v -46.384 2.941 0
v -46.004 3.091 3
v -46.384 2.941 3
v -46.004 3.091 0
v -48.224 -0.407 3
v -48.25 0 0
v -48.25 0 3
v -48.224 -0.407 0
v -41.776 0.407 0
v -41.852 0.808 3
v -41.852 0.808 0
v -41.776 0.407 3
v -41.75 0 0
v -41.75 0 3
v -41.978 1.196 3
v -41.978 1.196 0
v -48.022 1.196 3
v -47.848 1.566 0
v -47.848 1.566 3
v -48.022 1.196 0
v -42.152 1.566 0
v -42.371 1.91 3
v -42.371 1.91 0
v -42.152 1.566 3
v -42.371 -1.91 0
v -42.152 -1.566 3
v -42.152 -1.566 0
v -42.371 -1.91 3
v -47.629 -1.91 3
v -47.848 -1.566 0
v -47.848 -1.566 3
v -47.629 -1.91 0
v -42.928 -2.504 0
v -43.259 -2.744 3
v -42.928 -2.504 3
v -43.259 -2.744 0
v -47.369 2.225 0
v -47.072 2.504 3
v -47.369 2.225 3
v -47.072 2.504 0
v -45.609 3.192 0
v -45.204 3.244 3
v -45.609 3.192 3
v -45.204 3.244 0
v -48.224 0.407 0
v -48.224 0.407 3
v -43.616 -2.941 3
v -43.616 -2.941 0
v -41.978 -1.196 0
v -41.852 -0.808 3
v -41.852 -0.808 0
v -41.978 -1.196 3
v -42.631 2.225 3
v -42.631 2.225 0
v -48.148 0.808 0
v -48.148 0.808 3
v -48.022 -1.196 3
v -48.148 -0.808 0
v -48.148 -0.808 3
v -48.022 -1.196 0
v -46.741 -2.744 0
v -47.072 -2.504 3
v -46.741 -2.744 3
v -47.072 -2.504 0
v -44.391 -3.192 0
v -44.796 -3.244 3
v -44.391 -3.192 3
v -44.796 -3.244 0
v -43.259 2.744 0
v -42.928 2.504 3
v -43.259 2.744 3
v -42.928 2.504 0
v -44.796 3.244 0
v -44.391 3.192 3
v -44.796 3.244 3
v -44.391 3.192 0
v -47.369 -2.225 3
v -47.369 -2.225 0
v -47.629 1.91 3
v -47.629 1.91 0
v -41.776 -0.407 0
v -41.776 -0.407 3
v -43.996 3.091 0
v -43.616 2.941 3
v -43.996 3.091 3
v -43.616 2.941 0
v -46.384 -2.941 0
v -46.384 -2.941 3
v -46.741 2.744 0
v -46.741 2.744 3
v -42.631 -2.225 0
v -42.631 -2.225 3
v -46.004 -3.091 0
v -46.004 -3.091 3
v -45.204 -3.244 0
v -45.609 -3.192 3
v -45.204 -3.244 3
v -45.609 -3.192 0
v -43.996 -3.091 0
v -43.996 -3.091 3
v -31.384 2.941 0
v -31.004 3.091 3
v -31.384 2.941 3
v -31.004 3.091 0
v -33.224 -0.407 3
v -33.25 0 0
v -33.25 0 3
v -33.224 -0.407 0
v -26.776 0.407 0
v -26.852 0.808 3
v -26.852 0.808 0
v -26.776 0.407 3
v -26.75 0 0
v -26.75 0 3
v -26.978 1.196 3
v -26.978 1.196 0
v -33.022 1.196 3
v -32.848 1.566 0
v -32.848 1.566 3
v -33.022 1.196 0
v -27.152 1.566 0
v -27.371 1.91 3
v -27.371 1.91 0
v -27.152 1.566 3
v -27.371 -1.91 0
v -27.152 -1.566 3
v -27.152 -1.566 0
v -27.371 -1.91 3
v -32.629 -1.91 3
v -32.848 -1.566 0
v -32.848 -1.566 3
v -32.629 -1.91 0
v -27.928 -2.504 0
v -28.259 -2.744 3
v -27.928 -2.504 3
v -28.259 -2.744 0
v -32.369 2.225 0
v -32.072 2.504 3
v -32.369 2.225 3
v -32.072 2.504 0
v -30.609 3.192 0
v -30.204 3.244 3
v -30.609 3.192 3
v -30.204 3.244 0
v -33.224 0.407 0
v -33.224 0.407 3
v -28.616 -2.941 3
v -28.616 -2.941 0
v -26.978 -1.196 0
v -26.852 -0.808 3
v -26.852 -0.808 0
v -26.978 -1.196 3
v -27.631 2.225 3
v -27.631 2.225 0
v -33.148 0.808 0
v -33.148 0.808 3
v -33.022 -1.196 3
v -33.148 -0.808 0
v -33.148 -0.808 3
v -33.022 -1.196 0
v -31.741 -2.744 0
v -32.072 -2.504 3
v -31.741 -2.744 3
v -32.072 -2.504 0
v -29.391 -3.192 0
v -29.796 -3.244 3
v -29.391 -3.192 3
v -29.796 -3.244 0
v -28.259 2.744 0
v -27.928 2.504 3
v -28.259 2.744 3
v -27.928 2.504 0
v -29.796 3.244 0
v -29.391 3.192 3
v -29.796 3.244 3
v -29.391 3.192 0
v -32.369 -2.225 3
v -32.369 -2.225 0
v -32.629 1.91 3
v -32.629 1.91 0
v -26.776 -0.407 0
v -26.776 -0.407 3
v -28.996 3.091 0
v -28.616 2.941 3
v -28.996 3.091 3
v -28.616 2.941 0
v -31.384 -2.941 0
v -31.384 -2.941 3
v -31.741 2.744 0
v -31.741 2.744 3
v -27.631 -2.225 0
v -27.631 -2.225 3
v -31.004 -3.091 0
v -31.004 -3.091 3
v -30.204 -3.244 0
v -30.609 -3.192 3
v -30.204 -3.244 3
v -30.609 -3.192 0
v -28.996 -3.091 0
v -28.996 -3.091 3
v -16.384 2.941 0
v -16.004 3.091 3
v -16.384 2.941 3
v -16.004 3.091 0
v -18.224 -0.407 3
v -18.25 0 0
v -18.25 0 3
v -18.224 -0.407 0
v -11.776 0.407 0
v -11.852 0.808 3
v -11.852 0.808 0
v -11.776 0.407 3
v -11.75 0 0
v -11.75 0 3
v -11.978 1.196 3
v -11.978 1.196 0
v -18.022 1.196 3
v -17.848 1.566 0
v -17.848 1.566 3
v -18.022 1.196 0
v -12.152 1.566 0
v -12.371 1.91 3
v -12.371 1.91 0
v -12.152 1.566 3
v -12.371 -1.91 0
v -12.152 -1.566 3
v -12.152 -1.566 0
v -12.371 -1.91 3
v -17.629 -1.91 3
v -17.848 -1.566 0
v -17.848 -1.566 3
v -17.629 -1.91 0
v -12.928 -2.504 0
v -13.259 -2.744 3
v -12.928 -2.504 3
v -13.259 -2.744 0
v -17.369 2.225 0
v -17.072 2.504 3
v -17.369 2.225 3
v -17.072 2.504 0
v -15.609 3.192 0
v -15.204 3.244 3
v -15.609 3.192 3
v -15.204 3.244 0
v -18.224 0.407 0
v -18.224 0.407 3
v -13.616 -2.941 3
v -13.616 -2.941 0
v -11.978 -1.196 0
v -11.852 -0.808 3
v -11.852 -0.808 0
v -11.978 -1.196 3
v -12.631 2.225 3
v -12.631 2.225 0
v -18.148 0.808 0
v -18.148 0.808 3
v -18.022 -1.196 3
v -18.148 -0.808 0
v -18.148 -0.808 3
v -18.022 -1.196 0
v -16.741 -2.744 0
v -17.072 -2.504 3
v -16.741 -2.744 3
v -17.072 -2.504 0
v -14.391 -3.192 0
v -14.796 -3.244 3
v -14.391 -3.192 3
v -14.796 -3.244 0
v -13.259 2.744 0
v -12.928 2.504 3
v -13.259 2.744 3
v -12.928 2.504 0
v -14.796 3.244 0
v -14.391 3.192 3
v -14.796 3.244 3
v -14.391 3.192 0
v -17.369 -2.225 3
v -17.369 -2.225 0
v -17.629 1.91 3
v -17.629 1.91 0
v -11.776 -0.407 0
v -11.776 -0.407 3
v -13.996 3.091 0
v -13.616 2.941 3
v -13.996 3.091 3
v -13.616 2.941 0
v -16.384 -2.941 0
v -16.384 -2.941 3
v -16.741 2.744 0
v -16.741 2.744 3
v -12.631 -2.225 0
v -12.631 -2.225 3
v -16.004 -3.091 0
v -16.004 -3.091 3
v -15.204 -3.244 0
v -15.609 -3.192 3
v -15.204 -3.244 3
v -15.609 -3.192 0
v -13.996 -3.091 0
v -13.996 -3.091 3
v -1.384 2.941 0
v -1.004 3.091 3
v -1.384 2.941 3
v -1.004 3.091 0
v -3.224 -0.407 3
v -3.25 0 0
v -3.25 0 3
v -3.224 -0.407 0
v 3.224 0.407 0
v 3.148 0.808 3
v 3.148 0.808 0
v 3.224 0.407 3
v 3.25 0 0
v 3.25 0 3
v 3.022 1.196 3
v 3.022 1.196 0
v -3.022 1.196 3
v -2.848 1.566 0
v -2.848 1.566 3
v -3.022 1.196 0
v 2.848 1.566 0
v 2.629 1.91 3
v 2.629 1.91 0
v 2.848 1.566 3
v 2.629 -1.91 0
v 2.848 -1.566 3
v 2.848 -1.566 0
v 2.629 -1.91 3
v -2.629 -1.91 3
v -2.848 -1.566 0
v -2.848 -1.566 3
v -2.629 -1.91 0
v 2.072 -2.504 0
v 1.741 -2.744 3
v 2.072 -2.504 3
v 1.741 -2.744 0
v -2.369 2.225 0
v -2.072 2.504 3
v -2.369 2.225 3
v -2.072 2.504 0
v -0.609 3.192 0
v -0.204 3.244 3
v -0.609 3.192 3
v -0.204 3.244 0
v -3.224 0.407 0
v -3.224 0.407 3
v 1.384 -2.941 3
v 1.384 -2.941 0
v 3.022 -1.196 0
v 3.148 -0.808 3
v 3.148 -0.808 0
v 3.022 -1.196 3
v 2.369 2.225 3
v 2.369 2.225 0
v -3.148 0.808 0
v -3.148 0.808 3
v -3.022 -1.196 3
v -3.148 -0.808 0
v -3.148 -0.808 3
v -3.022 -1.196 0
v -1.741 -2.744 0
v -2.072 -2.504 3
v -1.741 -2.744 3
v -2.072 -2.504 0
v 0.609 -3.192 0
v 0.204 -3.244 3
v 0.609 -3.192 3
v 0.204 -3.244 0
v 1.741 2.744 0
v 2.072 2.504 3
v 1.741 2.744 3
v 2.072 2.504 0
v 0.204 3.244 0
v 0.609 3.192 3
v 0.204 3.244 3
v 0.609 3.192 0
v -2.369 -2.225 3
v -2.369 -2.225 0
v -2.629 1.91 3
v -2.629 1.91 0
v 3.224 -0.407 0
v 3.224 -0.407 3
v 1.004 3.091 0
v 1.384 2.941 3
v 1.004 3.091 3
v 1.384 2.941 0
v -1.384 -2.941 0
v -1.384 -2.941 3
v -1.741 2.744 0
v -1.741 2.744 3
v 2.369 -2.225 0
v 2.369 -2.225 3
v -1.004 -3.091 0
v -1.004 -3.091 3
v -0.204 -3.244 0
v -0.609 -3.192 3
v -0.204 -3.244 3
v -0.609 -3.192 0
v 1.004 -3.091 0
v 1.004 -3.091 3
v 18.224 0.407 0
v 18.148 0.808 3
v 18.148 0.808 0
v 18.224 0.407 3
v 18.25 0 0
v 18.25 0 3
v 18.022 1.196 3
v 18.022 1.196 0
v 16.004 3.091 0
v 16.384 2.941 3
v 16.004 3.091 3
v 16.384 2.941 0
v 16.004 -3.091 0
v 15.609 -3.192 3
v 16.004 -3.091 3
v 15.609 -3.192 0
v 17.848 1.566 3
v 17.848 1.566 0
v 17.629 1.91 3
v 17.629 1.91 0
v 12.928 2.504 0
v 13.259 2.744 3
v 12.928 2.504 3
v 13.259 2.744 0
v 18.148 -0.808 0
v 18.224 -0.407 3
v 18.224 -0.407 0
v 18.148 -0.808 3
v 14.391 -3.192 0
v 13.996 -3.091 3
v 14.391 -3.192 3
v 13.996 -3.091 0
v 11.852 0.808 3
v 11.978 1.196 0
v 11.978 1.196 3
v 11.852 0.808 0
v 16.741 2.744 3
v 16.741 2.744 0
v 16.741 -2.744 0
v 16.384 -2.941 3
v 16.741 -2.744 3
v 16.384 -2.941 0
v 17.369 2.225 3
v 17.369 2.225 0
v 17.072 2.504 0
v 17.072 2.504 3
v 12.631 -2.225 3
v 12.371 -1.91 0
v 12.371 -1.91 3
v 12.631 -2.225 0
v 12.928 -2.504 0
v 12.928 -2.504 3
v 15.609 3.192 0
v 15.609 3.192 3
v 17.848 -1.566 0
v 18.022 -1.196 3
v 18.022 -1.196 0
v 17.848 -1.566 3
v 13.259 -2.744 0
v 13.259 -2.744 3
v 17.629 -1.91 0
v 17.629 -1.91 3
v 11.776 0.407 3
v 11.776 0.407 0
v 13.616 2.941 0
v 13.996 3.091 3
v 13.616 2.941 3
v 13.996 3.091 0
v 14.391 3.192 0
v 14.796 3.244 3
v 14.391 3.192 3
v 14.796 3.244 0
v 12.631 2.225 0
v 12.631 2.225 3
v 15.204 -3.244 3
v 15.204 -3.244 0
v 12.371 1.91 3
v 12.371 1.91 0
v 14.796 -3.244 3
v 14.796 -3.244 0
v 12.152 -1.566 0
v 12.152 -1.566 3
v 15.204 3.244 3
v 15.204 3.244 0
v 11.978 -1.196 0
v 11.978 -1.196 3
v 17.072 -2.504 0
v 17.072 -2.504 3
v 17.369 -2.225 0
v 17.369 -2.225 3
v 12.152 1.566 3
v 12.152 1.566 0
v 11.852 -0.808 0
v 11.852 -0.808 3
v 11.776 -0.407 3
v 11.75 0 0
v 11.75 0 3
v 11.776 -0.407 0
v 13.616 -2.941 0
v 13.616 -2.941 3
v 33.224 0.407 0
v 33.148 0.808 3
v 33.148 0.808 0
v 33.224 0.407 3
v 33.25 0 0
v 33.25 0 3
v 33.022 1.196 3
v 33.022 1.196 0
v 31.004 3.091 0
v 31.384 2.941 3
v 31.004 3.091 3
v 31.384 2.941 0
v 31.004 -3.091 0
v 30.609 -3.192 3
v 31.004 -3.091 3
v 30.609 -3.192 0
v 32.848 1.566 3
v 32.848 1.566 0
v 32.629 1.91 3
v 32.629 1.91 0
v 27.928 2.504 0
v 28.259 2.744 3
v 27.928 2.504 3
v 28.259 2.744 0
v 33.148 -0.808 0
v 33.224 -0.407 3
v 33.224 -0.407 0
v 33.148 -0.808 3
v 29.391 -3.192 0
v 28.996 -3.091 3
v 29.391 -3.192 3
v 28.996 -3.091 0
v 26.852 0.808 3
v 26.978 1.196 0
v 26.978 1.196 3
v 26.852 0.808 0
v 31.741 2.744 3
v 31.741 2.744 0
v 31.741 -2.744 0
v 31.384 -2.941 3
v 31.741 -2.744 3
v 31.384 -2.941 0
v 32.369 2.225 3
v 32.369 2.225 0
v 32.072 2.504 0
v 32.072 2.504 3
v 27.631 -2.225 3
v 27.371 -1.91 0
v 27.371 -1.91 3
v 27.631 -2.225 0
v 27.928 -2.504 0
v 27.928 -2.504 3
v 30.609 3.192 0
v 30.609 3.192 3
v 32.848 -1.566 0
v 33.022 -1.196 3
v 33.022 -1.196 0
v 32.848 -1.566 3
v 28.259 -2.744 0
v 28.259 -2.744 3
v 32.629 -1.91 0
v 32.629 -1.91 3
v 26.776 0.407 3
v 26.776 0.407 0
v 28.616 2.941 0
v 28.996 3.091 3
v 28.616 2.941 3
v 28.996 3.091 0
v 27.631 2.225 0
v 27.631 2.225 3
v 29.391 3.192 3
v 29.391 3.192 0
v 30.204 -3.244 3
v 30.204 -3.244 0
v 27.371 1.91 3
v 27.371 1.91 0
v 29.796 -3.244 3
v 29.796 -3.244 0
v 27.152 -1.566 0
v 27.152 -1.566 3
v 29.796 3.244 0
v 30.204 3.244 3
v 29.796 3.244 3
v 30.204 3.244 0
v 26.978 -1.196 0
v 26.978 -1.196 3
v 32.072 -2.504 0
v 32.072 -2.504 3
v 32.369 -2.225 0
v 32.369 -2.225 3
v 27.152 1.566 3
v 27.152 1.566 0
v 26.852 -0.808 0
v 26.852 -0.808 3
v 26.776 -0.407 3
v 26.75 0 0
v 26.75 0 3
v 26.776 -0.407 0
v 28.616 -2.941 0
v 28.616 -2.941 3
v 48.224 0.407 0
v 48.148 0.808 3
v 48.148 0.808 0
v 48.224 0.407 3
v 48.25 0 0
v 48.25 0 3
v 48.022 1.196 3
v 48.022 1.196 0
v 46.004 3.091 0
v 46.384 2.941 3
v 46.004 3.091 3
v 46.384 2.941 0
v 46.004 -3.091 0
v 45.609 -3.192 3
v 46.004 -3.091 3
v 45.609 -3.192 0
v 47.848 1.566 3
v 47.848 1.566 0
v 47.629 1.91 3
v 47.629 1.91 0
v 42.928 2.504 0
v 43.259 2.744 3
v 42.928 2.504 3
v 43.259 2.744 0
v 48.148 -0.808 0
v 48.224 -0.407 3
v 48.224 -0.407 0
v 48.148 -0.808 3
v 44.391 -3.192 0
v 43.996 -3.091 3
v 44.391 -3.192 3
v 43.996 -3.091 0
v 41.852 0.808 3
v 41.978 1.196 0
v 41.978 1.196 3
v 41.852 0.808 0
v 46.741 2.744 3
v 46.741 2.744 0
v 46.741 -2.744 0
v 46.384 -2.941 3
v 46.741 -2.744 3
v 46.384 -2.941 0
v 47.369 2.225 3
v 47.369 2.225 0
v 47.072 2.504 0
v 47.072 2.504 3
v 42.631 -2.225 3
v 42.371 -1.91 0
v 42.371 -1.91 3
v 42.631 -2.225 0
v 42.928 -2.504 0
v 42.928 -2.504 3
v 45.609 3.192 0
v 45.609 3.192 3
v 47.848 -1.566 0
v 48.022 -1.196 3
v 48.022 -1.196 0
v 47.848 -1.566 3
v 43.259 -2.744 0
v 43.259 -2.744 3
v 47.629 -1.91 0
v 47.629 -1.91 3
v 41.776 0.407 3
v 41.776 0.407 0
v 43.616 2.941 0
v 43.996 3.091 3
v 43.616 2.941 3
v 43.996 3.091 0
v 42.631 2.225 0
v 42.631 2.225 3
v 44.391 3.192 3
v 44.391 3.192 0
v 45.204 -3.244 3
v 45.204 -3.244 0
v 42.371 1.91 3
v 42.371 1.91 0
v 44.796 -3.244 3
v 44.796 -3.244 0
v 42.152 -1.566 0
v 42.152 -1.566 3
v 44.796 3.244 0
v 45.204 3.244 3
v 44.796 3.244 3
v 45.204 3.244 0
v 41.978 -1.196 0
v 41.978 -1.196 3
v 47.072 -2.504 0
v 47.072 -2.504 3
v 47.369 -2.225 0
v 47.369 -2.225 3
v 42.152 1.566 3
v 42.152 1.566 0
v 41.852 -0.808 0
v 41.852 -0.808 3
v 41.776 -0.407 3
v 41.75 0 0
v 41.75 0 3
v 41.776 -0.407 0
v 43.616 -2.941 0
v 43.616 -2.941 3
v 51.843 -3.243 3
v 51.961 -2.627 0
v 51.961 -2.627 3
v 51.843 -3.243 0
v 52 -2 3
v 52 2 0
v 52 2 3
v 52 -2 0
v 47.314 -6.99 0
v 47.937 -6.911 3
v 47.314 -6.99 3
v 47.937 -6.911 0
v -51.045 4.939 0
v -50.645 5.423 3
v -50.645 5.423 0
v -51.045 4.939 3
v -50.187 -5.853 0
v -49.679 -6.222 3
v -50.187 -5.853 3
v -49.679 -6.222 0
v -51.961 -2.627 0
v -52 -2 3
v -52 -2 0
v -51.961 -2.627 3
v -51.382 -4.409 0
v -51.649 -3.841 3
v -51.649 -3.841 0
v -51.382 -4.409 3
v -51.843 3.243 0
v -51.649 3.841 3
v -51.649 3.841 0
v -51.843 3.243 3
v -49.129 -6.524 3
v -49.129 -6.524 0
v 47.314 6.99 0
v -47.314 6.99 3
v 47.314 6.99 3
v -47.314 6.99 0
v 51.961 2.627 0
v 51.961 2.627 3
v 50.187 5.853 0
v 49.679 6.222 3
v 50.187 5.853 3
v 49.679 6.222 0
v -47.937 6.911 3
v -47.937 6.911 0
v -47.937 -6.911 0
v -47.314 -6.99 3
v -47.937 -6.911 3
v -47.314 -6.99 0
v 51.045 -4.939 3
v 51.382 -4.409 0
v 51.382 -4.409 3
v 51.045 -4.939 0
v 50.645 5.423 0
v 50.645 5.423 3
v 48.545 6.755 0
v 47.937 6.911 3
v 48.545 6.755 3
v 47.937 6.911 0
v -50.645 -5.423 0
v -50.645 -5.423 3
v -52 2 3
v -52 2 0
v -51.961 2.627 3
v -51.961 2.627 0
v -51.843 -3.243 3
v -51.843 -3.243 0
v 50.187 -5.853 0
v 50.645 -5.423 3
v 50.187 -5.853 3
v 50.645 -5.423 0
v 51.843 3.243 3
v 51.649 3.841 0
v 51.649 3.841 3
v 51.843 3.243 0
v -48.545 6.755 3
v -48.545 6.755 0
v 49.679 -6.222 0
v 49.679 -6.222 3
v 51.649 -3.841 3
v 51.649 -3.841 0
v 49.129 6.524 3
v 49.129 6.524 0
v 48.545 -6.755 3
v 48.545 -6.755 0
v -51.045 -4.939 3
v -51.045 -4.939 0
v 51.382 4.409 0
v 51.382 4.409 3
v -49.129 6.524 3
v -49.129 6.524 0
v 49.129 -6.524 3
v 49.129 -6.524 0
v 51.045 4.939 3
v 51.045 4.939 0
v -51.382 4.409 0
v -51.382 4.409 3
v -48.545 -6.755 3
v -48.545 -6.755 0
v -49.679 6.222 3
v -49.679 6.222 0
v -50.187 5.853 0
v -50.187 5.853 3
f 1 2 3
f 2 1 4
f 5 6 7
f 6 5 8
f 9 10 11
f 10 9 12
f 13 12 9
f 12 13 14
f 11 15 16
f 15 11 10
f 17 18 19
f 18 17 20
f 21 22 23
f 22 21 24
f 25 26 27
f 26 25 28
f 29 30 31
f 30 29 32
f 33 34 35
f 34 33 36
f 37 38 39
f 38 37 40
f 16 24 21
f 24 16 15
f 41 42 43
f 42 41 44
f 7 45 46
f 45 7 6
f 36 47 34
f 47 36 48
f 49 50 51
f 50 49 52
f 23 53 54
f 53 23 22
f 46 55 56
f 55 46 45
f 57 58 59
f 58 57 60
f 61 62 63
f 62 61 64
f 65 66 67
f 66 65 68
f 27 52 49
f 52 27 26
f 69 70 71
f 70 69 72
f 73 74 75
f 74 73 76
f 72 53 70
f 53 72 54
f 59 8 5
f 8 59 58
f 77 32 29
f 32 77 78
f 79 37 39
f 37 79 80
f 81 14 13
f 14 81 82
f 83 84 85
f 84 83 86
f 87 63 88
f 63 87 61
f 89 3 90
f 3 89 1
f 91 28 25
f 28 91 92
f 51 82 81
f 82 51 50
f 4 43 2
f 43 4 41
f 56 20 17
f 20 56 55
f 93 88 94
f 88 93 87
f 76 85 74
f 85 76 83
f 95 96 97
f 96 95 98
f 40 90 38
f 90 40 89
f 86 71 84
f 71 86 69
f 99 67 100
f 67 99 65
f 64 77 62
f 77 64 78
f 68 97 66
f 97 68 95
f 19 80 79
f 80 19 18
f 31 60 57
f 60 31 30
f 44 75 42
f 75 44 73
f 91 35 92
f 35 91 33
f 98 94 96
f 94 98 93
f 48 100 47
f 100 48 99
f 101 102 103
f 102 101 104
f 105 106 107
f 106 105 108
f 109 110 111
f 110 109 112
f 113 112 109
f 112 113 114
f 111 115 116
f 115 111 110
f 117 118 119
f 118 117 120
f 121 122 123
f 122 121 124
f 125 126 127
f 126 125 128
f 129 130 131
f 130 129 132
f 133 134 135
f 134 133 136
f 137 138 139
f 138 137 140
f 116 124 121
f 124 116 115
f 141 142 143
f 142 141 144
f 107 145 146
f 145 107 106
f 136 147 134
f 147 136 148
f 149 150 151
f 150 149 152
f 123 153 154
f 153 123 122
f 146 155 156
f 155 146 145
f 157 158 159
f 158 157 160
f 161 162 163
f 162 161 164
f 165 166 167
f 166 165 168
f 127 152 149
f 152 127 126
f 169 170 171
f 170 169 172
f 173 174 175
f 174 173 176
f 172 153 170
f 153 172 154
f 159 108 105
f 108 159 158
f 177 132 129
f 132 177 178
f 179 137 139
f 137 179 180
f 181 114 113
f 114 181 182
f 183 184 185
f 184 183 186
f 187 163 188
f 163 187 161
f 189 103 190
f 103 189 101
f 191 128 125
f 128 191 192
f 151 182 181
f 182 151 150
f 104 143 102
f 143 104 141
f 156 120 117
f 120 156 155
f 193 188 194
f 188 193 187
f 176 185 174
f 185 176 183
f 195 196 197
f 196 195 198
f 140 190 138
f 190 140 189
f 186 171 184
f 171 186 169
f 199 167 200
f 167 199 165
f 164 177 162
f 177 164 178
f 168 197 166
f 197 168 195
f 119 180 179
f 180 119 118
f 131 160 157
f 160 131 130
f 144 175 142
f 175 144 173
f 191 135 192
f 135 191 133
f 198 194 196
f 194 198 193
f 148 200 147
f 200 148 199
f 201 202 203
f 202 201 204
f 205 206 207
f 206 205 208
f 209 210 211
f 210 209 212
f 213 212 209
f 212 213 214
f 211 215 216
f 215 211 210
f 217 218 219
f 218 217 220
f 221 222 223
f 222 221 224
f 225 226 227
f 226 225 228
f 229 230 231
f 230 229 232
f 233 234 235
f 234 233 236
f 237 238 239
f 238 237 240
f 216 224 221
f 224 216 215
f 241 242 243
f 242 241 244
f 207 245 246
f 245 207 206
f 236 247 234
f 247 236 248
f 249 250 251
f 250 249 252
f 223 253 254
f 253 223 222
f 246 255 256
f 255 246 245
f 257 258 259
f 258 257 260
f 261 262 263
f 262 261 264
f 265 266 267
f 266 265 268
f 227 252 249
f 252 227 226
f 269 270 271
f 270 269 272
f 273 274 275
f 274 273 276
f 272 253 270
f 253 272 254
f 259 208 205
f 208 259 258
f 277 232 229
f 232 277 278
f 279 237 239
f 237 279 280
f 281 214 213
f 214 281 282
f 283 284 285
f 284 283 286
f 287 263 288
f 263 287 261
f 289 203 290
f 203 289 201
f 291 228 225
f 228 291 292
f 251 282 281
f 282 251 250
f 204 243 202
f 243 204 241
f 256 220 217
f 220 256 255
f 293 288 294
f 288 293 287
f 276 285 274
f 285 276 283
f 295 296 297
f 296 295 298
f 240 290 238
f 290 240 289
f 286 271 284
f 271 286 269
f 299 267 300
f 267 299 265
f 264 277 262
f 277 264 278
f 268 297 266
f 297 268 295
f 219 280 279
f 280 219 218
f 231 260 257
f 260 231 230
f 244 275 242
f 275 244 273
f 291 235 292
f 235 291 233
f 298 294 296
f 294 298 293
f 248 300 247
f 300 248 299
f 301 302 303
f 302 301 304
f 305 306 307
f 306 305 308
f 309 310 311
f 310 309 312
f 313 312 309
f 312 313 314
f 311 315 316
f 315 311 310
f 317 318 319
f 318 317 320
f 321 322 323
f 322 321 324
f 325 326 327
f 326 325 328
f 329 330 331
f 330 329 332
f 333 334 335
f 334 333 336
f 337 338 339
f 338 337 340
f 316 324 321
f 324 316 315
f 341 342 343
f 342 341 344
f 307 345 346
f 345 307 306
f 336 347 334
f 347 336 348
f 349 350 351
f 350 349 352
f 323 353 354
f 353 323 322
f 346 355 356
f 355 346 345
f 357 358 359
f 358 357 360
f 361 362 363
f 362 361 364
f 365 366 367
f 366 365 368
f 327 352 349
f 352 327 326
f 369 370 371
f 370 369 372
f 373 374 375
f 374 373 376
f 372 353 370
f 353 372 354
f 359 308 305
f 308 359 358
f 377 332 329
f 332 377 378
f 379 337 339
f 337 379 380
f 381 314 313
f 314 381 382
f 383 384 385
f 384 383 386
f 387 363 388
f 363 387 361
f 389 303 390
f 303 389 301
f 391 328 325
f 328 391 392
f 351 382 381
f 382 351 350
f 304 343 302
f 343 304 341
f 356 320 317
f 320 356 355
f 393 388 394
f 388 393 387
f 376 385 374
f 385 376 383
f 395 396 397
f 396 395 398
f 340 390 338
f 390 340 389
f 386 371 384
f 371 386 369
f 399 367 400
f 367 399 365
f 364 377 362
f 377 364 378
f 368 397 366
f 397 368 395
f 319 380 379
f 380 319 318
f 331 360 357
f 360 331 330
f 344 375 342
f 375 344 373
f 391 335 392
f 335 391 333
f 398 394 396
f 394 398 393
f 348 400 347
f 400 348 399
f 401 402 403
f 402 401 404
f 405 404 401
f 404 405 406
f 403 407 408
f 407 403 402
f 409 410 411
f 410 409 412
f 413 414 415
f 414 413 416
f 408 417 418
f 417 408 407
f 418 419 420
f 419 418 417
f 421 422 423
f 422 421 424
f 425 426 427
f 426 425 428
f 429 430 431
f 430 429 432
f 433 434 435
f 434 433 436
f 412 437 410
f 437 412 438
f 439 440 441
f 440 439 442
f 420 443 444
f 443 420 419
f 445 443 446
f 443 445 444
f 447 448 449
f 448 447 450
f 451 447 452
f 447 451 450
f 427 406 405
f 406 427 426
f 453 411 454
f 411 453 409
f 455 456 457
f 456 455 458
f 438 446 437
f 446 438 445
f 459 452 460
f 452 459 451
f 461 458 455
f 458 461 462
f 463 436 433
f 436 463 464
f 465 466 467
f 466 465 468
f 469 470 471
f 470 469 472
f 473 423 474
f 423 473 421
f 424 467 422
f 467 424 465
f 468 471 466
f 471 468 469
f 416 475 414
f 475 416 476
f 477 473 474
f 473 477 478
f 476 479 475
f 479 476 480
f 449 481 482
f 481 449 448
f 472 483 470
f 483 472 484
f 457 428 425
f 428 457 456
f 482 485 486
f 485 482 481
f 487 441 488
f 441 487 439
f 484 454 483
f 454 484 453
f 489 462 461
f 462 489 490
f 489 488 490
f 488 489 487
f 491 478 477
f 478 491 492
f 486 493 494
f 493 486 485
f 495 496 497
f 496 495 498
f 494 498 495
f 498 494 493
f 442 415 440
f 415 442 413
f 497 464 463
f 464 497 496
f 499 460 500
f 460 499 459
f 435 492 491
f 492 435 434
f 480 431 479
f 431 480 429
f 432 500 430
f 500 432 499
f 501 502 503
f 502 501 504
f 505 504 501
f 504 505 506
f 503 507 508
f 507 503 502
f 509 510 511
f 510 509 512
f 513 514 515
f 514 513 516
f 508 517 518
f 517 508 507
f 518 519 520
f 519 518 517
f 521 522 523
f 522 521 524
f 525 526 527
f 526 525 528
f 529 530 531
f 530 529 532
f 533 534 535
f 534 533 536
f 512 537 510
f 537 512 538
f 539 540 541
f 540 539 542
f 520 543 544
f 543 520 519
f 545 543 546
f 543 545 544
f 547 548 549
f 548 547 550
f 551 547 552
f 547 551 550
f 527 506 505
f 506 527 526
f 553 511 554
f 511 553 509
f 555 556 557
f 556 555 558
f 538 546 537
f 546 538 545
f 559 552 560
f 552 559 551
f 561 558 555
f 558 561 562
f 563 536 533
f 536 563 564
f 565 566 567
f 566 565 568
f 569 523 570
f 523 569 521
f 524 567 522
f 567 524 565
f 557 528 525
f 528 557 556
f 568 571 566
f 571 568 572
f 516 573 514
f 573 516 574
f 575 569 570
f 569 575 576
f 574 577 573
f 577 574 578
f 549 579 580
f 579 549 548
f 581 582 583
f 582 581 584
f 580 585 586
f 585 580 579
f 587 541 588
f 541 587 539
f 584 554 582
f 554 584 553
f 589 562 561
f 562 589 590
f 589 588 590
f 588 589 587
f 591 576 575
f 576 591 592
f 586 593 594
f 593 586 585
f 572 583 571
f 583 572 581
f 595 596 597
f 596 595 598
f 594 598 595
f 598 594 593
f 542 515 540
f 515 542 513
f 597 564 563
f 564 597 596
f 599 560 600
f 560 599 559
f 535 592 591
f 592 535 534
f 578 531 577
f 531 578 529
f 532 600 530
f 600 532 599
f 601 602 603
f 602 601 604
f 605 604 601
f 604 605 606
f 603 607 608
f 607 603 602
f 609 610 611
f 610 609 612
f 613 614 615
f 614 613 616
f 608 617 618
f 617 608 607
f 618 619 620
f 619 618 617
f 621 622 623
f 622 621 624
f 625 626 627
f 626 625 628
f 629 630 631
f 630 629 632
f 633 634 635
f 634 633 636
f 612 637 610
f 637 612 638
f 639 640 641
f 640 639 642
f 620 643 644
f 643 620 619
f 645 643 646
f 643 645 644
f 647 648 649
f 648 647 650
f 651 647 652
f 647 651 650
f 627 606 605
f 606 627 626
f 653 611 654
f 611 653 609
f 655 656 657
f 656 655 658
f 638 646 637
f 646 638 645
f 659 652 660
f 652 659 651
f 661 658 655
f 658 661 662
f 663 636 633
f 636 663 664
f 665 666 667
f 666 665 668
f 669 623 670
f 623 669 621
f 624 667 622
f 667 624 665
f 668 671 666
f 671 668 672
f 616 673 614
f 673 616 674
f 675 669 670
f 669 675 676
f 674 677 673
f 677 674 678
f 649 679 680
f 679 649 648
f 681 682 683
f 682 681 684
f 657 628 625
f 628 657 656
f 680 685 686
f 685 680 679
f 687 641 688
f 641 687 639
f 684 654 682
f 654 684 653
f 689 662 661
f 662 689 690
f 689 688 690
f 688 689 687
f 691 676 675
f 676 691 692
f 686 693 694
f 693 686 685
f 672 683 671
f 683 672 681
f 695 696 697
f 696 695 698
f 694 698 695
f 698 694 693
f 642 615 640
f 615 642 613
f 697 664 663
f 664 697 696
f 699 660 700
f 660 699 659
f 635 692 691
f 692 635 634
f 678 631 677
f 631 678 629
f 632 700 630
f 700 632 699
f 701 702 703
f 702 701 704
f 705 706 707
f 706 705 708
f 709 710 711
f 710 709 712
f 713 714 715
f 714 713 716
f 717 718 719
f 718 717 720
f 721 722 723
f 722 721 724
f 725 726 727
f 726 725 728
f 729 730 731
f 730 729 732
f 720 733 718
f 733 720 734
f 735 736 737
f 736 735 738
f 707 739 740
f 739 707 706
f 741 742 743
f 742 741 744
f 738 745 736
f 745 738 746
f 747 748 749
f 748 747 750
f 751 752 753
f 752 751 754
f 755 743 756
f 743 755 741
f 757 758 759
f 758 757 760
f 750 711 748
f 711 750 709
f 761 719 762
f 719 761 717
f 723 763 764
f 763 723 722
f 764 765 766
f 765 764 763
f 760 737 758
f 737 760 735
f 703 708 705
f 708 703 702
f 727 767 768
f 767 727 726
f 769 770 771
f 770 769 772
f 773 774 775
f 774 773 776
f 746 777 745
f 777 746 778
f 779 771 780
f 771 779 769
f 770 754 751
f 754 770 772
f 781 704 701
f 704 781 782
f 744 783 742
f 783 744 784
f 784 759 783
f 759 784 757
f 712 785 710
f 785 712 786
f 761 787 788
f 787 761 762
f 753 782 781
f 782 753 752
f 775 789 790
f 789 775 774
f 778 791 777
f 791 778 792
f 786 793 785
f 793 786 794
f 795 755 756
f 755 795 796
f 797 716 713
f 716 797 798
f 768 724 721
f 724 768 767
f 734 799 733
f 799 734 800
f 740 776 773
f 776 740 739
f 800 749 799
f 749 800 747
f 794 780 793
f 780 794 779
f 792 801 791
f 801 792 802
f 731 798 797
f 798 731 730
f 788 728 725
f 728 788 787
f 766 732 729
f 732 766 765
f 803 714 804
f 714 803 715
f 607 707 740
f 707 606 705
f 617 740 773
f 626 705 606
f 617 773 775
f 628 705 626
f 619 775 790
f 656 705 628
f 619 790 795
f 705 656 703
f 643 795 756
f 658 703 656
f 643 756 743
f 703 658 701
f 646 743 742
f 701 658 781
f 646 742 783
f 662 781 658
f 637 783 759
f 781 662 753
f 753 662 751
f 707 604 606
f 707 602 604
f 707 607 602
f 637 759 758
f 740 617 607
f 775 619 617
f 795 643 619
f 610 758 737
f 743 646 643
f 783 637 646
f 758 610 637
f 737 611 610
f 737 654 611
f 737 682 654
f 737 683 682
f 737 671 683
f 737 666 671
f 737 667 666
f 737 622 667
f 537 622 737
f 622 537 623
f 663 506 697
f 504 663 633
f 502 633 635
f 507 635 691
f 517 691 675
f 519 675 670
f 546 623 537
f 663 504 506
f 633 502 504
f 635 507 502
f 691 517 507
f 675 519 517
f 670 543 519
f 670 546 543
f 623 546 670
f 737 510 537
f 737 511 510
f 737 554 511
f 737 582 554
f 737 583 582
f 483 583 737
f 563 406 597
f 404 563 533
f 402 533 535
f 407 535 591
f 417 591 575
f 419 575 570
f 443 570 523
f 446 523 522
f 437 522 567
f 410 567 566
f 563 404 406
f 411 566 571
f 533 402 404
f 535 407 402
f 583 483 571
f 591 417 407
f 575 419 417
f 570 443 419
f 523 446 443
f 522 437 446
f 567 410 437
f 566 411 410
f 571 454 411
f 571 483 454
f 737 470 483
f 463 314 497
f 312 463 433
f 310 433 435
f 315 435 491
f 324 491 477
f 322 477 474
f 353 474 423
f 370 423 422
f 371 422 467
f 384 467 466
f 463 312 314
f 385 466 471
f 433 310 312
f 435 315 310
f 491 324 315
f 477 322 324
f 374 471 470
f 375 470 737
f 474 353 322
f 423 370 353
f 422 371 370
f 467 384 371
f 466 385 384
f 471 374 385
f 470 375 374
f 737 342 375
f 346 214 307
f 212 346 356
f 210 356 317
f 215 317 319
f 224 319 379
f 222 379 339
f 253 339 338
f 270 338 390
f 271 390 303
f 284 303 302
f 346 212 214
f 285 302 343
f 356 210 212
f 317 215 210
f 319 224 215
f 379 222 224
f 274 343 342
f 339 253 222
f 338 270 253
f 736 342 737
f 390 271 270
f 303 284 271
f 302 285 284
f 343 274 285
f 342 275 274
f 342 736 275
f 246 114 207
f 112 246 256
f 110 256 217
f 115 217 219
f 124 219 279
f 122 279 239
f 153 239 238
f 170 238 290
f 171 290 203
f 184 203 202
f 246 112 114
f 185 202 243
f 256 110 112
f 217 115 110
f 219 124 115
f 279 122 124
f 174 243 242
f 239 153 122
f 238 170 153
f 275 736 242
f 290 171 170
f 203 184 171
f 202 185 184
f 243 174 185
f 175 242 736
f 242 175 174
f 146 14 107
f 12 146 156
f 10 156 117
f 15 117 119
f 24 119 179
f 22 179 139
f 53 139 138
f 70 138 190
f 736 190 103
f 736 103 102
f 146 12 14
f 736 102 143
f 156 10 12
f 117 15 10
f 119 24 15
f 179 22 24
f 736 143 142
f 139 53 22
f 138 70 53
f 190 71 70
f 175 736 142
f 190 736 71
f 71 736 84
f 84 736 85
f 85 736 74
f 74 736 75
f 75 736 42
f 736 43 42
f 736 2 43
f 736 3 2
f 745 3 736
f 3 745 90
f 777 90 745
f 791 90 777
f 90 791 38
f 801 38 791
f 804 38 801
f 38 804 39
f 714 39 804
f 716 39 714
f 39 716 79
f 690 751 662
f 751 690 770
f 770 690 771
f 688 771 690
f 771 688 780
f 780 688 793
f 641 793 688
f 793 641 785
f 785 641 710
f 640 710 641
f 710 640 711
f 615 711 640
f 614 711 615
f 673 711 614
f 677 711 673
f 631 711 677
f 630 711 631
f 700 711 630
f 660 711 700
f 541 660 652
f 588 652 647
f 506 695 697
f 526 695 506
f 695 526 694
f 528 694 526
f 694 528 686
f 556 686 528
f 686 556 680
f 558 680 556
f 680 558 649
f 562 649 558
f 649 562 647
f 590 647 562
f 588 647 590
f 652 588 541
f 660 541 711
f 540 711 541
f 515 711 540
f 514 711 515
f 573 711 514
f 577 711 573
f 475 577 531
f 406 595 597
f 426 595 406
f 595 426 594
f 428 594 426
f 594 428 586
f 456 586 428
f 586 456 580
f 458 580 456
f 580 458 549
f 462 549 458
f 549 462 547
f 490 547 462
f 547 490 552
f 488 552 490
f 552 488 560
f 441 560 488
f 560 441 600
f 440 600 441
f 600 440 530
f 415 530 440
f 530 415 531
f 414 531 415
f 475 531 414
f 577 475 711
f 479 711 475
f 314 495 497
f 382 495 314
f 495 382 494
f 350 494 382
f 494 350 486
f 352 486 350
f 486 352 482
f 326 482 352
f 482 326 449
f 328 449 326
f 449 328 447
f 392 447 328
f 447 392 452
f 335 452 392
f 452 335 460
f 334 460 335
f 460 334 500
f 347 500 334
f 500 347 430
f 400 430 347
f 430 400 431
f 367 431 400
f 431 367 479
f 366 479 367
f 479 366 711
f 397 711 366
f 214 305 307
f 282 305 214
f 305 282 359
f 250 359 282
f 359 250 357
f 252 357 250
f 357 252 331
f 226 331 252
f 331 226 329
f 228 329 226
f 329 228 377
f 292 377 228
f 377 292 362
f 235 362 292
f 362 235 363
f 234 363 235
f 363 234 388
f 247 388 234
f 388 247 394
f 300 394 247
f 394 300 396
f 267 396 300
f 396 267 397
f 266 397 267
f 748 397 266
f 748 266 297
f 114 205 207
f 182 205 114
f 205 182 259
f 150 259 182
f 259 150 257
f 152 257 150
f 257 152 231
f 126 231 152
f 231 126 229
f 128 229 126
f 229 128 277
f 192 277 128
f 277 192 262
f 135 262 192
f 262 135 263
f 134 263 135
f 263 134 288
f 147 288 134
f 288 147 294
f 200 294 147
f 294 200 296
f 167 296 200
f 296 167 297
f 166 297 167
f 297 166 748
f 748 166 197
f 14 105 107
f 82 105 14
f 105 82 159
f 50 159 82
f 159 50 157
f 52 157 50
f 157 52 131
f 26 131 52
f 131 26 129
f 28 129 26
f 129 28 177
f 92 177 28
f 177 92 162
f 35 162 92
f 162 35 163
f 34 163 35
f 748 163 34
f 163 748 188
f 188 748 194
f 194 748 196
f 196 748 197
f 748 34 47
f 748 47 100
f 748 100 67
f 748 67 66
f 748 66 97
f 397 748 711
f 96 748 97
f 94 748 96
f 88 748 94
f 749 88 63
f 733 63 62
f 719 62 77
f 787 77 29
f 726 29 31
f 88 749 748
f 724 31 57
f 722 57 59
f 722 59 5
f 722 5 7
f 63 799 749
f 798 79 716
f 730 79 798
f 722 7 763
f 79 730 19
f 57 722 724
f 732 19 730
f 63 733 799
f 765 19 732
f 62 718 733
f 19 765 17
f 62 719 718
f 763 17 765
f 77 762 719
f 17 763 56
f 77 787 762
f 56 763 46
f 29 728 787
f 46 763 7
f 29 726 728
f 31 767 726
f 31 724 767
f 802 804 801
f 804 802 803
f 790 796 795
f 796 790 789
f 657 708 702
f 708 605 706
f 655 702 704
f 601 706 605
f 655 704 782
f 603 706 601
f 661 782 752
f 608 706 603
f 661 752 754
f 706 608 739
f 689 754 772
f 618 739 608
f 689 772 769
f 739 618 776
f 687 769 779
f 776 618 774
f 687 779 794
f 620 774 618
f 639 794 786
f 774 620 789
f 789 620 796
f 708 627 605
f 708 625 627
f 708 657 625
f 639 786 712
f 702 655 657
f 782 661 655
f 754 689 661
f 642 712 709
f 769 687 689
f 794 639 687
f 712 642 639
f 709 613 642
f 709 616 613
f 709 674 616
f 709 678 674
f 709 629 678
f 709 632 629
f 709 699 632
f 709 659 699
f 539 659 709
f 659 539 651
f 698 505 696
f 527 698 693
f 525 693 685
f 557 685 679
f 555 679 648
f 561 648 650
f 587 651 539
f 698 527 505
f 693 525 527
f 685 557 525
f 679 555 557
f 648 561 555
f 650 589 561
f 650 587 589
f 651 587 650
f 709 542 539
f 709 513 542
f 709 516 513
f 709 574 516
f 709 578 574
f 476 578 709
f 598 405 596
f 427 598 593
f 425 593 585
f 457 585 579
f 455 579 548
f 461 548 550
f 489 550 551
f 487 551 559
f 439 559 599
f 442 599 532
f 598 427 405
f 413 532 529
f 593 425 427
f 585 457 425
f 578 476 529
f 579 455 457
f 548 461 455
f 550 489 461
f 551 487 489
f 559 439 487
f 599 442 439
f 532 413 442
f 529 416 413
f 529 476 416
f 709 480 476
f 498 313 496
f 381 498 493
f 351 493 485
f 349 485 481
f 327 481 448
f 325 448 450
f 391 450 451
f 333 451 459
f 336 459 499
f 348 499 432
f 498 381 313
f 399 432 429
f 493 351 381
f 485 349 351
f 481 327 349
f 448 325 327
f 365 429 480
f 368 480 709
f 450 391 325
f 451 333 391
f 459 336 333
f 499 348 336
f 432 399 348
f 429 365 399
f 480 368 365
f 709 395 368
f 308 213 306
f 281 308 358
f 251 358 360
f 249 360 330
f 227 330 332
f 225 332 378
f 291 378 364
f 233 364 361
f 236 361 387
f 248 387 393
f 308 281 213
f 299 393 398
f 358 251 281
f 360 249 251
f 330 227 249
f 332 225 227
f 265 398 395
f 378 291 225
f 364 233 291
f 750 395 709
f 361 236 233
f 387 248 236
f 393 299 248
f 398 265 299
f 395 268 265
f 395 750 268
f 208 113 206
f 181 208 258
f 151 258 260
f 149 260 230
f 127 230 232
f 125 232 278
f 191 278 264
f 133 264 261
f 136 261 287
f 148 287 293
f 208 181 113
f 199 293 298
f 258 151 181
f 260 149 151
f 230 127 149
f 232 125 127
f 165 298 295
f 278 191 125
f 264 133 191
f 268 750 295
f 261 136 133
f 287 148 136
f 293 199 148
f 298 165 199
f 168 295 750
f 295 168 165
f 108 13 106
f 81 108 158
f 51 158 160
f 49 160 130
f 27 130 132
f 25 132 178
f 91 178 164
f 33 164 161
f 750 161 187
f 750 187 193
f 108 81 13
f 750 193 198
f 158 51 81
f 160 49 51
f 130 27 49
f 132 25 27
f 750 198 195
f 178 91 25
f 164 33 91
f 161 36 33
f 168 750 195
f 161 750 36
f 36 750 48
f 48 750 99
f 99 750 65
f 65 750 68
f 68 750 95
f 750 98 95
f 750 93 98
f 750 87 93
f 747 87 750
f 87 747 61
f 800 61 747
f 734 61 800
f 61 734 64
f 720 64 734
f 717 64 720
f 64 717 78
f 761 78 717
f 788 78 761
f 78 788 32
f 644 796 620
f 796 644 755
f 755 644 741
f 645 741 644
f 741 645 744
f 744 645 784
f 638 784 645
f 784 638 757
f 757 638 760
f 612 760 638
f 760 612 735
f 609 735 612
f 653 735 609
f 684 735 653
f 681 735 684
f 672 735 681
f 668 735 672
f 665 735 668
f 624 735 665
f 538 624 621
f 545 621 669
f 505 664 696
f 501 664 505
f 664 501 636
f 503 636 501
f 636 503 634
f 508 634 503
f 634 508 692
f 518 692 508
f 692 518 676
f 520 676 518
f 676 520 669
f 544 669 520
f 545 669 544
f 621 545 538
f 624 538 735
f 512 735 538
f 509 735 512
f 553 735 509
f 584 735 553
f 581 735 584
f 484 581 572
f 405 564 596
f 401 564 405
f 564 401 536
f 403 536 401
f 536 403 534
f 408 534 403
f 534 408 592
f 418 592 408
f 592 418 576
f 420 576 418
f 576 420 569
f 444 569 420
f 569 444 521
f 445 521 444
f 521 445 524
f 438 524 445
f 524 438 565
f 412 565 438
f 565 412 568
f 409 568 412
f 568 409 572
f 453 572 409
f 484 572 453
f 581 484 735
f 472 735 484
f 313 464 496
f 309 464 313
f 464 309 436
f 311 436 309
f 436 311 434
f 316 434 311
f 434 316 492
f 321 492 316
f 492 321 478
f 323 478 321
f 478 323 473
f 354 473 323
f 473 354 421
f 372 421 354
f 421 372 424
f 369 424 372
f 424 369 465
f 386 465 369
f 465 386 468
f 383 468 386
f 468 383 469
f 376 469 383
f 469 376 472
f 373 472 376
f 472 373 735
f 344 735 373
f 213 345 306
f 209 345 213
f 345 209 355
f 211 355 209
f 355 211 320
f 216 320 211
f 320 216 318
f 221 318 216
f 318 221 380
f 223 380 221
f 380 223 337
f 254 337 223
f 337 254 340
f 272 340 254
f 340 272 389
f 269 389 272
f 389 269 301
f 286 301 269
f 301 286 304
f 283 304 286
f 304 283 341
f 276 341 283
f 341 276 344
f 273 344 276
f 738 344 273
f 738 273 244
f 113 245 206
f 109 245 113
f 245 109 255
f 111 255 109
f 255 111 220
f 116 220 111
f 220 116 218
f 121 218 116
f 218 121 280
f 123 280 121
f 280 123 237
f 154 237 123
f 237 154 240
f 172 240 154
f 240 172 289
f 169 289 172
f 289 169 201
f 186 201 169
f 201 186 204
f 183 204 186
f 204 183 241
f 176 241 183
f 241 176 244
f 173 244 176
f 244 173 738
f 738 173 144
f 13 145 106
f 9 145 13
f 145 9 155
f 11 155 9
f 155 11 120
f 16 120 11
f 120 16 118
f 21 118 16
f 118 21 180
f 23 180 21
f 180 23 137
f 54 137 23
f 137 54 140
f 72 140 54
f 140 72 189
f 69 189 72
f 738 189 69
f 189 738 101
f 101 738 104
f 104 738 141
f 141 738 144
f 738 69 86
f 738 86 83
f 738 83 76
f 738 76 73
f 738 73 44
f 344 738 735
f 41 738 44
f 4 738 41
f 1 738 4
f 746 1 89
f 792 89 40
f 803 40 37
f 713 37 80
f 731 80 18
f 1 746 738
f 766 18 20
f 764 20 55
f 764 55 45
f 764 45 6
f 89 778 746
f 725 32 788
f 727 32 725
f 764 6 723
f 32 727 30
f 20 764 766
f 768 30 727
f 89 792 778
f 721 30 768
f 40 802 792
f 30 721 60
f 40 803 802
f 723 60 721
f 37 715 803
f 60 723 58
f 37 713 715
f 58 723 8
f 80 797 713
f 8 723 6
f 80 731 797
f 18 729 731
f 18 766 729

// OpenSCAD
$fn = 50;


difference() {
	union() {
		hull() {
			translate(v = [-47.0000000000, 2.0000000000, 0]) {
				cylinder(h = 3, r = 5);
			}
			translate(v = [47.0000000000, 2.0000000000, 0]) {
				cylinder(h = 3, r = 5);
			}
			translate(v = [-47.0000000000, -2.0000000000, 0]) {
				cylinder(h = 3, r = 5);
			}
			translate(v = [47.0000000000, -2.0000000000, 0]) {
				cylinder(h = 3, r = 5);
			}
		}
	}
	union() {
		translate(v = [-45.0000000000, 0.0000000000, 0]) {
			translate(v = [0, 0, -100]) {
				cylinder(h = 200, r = 3.2500000000);
			}
		}
		translate(v = [-30.0000000000, 0.0000000000, 0]) {
			translate(v = [0, 0, -100]) {
				cylinder(h = 200, r = 3.2500000000);
			}
		}
		translate(v = [-15.0000000000, 0.0000000000, 0]) {
			translate(v = [0, 0, -100]) {
				cylinder(h = 200, r = 3.2500000000);
			}
		}
		translate(v = [0, 0, -100]) {
			cylinder(h = 200, r = 3.2500000000);
		}
		translate(v = [15.0000000000, 0.0000000000, 0]) {
			translate(v = [0, 0, -100]) {
				cylinder(h = 200, r = 3.2500000000);
			}
		}
		translate(v = [30.0000000000, 0.0000000000, 0]) {
			translate(v = [0, 0, -100]) {
				cylinder(h = 200, r = 3.2500000000);
			}
		}
		translate(v = [45.0000000000, 0.0000000000, 0]) {
			translate(v = [0, 0, -100]) {
				cylinder(h = 200, r = 3.2500000000);
			}
		}
	}
}
